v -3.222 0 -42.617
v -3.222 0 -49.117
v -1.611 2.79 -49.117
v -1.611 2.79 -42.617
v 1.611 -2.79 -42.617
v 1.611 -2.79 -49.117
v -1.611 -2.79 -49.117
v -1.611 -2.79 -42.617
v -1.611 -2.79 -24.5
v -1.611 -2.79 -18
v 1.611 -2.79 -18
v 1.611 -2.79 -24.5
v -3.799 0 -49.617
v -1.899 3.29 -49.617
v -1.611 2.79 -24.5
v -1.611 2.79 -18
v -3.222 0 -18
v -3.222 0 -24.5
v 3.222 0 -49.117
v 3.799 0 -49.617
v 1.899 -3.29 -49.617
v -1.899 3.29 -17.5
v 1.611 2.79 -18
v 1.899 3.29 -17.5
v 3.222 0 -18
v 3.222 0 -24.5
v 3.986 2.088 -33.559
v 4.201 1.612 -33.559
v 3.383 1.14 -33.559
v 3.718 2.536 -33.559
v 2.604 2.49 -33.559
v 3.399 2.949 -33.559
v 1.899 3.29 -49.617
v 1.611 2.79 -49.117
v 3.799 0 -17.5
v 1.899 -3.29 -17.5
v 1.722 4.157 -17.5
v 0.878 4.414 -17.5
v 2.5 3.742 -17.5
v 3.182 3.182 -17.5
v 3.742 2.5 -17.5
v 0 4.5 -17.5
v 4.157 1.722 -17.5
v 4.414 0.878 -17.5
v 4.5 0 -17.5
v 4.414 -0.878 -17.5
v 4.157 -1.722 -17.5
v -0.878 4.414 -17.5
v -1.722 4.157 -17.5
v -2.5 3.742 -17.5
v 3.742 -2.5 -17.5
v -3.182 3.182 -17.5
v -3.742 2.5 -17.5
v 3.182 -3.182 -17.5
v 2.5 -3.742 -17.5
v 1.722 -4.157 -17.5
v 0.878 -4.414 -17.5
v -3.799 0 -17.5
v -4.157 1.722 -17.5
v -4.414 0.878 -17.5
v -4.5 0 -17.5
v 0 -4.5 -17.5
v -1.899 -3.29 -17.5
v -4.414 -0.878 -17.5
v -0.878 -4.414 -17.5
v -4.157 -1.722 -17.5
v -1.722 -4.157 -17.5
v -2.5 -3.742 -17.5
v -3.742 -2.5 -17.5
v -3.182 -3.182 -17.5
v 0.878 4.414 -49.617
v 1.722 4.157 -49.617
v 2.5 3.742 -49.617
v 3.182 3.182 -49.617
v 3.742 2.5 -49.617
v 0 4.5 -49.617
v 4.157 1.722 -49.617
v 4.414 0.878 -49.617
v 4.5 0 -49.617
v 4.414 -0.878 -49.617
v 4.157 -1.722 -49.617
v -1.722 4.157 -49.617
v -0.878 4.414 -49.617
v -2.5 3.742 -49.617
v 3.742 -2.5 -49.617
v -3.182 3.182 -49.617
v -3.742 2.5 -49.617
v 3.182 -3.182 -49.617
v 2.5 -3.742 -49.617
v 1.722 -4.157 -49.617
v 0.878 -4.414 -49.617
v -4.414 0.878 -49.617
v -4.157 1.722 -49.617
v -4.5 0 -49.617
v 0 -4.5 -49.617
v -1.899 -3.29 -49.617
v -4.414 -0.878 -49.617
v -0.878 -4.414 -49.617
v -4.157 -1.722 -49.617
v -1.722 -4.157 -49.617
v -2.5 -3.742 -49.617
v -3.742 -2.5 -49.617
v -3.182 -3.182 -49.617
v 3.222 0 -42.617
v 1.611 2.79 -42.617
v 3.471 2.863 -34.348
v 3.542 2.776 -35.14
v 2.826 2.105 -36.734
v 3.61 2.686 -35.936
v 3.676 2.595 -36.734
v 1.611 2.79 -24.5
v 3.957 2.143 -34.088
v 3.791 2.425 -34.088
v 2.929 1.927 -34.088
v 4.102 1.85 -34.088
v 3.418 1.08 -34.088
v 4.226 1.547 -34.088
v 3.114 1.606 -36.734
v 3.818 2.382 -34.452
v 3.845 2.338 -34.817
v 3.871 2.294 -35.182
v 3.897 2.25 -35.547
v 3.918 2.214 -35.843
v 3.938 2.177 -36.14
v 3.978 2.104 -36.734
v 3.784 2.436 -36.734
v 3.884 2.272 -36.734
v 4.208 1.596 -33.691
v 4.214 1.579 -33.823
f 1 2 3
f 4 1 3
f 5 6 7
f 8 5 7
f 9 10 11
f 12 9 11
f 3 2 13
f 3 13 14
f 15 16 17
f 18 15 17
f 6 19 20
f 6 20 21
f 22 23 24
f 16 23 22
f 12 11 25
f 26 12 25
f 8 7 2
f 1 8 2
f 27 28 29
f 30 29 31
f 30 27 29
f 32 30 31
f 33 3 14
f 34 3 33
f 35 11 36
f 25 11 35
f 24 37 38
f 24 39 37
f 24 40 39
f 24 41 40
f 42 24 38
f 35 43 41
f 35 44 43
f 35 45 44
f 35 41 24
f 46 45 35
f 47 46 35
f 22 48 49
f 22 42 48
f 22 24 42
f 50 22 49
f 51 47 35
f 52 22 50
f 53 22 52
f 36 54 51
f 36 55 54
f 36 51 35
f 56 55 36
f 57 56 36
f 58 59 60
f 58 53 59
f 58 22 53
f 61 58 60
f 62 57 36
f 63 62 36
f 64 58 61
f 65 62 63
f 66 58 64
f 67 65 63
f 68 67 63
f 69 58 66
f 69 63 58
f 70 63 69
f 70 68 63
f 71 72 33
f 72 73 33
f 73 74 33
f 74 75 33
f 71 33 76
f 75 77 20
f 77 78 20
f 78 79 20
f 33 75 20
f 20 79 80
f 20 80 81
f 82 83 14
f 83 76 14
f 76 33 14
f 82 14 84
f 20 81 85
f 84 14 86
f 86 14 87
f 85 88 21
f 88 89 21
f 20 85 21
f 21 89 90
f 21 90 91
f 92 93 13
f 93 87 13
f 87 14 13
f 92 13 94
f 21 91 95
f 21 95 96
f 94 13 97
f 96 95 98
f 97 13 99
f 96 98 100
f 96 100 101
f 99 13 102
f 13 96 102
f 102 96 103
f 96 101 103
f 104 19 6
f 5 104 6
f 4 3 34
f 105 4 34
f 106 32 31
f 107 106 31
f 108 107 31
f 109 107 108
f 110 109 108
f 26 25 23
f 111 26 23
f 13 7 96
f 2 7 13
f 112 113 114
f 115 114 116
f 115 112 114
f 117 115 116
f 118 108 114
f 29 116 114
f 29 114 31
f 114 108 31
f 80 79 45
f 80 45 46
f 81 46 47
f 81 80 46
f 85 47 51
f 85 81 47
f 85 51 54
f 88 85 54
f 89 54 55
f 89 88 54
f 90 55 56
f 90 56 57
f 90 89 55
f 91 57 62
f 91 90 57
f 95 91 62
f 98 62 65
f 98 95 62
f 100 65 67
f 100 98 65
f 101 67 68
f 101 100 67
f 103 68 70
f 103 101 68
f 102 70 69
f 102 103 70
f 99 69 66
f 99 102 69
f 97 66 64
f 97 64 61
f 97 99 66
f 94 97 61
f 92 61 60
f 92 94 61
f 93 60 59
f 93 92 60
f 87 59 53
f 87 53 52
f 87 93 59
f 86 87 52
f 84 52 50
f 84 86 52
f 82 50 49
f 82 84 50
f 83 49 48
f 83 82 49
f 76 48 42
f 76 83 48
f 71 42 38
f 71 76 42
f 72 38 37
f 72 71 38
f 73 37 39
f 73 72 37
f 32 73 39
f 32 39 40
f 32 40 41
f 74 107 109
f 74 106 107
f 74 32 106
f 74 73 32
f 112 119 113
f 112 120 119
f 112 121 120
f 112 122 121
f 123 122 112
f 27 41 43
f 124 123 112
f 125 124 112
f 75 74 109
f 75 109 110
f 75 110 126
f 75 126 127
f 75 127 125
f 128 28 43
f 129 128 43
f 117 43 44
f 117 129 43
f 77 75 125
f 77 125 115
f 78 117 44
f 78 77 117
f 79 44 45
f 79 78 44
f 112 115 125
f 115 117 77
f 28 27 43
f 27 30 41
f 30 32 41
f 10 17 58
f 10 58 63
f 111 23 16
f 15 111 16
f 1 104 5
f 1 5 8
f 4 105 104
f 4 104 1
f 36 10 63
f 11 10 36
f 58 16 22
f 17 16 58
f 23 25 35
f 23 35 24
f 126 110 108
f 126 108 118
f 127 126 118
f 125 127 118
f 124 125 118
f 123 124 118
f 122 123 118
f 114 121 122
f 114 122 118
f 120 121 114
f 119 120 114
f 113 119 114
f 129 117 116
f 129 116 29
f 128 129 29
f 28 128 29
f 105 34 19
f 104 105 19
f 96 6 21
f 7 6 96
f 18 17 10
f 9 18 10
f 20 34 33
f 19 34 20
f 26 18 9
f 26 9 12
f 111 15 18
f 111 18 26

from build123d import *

# Parameters (mm, degrees)
SKETCH1_W          = 4.5
SKETCH1_H          = 32.11709914
CUT_EXTRUDE1_DEPTH = 7
CUT_EXTRUDE2_DEPTH = 7
CHAMFER1_SIZE      = 0.5
CUT_EXTRUDE3_DEPTH = 1


with BuildPart() as part:
    # Sketch1 → Revolve-Thin1 (revolve)
    with BuildSketch(Plane(origin=(0, 0, 0), x_dir=(1, 0, 0), z_dir=(0, 1, 0))):
        with Locations((2.25, 33.55854957)):
            Rectangle(SKETCH1_W, SKETCH1_H)
    revolve(axis=Axis((0, 0, 0), (0, 0, -1)))

    # Sketch2 → Cut-Extrude1 (cut)
    with BuildSketch(Plane.XY.offset(-17.5)):
        Polygon((1.610807251, 2.79), (-1.610807251, 2.79), (-3.221614502, 0), (-1.610807251, -2.79), (1.610807251, -2.79), (3.221614502, 0), align=None)
    extrude(amount=-CUT_EXTRUDE1_DEPTH, mode=Mode.SUBTRACT)

    # Sketch3 → Cut-Extrude2 (cut)
    with BuildSketch(Plane(origin=(0, 0, -49.61709914), x_dir=(-1, 0, 0), z_dir=(0, 0, -1))):
        Polygon((1.610807251, 2.79), (-1.610807251, 2.79), (-3.221614502, 0), (-1.610807251, -2.79), (1.610807251, -2.79), (3.221614502, 0), align=None)
    extrude(amount=-CUT_EXTRUDE2_DEPTH, mode=Mode.SUBTRACT)

    # Chamfer1
    chamfer1_edges = [part.edges().sort_by_distance(p)[0] for p in [
        (2.416210877, 1.395, -17.5),
        (0, 2.79, -17.5),
        (-2.416210877, 1.395, -17.5),
        (-2.416210877, -1.395, -17.5),
        (0, -2.79, -17.5),
        (2.416210877, -1.395, -17.5),
        (-2.416210877, 1.395, -49.61709914),
        (0, 2.79, -49.61709914),
        (2.416210877, 1.395, -49.61709914),
        (2.416210877, -1.395, -49.61709914),
        (0, -2.79, -49.61709914),
        (-2.416210877, -1.395, -49.61709914),
    ]]
    chamfer(chamfer1_edges, length=CHAMFER1_SIZE)

    # Sketch4 → Cut-Extrude3 (cut)
    with BuildSketch(Plane(origin=(3.897114317, 2.25, 0), x_dir=(0, 0, -1), z_dir=(0.866025404, 0.5, 0))):
        Polygon((36.73354957, 0.409595353), (36.73354957, -0.166636619), (34.087716237, 0.204797676), (34.087716237, -0.773397436), (33.55854957, -0.704707532), (33.55854957, 0.854807692), align=None)
    extrude(amount=-CUT_EXTRUDE3_DEPTH, mode=Mode.SUBTRACT)


solid = part.part
